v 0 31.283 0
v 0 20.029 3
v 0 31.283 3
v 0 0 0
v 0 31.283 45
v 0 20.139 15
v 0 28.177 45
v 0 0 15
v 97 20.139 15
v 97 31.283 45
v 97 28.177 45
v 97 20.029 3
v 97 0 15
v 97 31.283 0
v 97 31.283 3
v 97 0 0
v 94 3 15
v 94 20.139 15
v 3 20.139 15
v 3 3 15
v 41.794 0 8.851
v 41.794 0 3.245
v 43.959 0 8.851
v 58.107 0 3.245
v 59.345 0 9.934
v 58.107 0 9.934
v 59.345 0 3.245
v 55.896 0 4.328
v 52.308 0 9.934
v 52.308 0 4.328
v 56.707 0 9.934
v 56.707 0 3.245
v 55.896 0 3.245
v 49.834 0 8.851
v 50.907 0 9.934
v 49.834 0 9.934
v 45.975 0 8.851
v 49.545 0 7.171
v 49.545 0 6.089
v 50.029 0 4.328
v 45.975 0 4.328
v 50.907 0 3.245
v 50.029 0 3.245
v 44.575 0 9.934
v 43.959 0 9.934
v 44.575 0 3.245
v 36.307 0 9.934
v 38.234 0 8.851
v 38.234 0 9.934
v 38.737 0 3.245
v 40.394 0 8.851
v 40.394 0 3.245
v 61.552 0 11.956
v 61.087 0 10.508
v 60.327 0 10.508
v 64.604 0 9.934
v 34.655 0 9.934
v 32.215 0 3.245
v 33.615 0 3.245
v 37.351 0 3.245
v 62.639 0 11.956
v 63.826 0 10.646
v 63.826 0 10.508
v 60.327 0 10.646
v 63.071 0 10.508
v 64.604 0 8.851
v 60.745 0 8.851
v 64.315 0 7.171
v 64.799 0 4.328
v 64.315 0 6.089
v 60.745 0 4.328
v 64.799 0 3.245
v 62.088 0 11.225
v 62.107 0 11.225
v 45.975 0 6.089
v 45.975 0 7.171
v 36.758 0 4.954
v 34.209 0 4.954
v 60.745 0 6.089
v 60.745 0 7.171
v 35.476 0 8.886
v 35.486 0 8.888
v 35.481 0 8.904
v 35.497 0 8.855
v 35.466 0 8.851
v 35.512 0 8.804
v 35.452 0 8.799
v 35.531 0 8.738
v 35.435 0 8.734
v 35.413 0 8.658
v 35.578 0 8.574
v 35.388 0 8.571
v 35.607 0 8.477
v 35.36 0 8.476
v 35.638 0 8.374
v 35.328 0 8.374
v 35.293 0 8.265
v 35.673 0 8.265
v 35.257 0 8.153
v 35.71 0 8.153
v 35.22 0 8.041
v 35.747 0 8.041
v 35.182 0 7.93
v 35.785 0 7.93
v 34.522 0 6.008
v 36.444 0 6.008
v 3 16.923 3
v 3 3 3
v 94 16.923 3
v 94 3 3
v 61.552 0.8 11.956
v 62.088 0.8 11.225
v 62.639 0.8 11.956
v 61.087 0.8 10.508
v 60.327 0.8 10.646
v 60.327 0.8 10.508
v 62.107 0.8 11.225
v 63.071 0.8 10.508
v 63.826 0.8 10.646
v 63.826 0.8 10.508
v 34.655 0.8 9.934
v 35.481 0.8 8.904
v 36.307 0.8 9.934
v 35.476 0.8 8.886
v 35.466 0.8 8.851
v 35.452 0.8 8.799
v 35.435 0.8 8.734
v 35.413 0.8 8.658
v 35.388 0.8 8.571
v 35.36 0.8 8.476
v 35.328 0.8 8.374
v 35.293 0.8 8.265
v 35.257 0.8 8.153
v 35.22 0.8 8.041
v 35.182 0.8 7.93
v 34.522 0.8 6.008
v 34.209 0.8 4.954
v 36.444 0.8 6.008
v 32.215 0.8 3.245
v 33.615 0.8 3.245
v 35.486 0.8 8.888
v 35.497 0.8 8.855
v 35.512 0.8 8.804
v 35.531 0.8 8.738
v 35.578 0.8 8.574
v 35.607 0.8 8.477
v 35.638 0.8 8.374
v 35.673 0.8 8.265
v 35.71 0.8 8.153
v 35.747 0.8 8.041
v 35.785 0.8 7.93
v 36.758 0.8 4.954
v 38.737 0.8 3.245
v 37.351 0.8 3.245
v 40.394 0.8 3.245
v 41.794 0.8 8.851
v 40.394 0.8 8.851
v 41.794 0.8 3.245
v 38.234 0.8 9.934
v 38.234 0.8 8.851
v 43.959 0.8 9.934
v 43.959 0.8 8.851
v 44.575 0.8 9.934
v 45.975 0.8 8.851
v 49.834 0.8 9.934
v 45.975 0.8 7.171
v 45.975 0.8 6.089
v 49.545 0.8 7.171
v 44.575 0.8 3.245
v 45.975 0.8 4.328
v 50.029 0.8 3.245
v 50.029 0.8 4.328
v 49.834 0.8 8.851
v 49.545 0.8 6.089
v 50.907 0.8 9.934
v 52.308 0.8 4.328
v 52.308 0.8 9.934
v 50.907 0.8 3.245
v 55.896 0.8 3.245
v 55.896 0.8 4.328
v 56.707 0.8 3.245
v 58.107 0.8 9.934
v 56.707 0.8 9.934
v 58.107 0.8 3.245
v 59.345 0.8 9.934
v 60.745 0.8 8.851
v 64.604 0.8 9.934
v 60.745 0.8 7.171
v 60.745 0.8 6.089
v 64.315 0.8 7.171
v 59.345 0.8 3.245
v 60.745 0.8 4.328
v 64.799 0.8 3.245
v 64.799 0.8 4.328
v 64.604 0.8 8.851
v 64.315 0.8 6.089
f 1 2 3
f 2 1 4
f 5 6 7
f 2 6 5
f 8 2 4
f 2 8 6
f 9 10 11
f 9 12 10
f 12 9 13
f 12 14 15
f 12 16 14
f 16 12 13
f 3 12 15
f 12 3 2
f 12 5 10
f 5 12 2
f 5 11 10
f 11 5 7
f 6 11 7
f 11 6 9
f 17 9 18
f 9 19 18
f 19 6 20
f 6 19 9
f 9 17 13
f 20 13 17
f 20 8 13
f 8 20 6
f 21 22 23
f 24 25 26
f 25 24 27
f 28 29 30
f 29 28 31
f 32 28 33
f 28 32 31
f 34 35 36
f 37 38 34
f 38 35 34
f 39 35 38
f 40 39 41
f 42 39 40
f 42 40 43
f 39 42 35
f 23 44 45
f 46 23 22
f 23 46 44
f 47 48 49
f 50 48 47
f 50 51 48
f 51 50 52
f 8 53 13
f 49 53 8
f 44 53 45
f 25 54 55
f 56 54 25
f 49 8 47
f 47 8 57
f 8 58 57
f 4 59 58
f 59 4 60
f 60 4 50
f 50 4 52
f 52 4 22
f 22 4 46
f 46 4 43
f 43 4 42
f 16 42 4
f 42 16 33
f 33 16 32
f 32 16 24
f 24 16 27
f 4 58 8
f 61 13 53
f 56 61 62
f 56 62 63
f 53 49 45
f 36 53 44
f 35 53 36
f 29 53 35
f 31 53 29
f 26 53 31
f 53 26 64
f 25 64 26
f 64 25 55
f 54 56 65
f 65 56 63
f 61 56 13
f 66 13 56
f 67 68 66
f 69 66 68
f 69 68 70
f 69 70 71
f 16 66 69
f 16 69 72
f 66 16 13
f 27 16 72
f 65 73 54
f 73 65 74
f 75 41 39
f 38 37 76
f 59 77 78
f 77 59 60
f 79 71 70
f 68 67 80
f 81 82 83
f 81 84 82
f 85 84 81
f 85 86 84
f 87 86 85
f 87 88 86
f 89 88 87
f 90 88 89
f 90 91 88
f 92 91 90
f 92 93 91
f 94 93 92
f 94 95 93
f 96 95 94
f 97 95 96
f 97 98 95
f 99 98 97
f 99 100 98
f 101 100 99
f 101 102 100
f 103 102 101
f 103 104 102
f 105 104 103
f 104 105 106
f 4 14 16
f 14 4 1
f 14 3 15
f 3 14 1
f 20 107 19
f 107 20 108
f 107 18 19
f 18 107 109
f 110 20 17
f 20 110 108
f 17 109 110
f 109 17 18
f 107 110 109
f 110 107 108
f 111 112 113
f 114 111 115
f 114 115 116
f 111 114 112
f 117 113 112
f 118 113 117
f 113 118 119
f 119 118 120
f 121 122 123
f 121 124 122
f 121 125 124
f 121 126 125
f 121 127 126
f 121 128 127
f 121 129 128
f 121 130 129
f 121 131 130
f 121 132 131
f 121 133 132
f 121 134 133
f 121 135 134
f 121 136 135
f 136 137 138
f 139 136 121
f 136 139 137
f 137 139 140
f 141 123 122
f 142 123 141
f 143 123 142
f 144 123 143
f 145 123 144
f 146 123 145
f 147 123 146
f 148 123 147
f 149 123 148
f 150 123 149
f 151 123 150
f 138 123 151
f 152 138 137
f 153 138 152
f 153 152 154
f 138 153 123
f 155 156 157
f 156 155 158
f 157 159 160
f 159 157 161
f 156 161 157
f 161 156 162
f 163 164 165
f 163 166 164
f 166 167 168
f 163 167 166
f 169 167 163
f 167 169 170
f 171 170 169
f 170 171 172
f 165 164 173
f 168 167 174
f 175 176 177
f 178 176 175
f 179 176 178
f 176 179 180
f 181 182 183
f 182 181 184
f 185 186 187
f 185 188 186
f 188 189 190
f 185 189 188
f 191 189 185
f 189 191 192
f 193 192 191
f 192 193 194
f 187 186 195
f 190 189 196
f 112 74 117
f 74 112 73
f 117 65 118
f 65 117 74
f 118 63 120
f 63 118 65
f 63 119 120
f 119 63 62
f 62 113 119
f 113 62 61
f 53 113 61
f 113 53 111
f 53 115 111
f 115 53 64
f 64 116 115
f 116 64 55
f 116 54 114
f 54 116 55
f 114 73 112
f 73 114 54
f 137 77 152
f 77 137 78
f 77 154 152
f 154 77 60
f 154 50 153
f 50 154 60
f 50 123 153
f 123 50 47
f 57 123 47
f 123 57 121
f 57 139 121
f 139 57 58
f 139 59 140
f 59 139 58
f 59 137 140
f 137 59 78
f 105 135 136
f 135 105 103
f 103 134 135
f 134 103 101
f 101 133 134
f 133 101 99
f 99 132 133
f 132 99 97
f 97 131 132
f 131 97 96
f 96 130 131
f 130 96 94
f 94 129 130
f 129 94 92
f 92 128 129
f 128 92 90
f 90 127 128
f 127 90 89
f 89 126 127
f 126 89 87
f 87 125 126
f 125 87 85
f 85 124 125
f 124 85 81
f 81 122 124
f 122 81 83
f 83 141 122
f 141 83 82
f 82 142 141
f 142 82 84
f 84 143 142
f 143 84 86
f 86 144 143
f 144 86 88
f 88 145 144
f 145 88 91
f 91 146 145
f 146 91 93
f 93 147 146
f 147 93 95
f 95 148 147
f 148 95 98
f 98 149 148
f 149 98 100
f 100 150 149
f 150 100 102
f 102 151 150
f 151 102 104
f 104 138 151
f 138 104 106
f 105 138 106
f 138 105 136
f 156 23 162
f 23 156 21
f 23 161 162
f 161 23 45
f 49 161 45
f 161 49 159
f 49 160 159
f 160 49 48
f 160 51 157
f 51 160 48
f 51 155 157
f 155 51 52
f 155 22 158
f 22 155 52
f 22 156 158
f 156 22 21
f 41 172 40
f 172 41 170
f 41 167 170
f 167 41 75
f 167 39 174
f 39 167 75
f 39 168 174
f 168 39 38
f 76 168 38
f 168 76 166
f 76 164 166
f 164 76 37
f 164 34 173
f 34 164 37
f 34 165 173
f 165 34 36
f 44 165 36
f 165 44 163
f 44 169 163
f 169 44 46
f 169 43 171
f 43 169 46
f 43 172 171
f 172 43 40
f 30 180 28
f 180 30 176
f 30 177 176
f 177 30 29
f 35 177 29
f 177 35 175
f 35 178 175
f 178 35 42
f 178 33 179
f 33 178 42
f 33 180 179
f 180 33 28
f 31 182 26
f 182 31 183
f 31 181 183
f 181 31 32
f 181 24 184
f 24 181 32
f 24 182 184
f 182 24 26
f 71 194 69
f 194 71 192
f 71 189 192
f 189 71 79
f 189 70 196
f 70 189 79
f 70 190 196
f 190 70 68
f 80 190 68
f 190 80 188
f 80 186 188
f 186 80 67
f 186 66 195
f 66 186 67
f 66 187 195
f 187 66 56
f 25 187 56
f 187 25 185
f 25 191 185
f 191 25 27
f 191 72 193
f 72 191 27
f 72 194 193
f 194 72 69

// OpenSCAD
card_w       = 90;
card_h       = 50;
stack        = 12;
clr_w        = 1;
clr_d        = 1.5;
angle        = 15;
wall_side    = 3;
front_t      = 3;
front_h      = 15;
floor_t      = 3;
back_t       = 3;
total_h      = 45;
lip_extra    = 1;
eps          = 0.01;
label        = "ATELIÊ";
font_name    = "Liberation Sans:style=Bold";
text_size    = 7;
text_depth   = 0.8;
pocket_d = stack / cos(angle) + clr_d;
bt       = back_t / cos(angle);
y0       = front_t + pocket_d;
W        = card_w + clr_w + 2 * wall_side;
D        = y0 + bt + (total_h - floor_t) * tan(angle);
H        = total_h;
echo(largura = W, profundidade = D, altura = H);
module outer_profile() {
    polygon([
        [0, 0],
        [D, 0],
        [D, total_h],
        [y0 + (total_h - floor_t) * tan(angle), total_h],
        [y0 + (front_h - floor_t) * tan(angle), front_h],
        [0, front_h]
    ]);
}
module rear_void() {
    polygon([
        [y0 + bt, floor_t],
        [D + eps, floor_t],
        [D + eps, total_h - eps],
        [D, total_h]
    ]);
}
module pocket_profile() {
    zc = front_h + lip_extra;
    polygon([
        [front_t, floor_t],
        [y0, floor_t],
        [y0 + (zc - floor_t) * tan(angle), zc],
        [front_t, zc]
    ]);
}
module along_x(len) {
    rotate([90, 0, 90]) linear_extrude(height = len) children();
}
difference() {
    along_x(W) difference() {
        outer_profile();
        rear_void();
    }
    translate([wall_side, 0, 0]) along_x(card_w + clr_w) pocket_profile();
    translate([W / 2, text_depth, front_h / 2])
        rotate([90, 0, 0])
            linear_extrude(height = text_depth + eps)
                text(label, size = text_size, font = font_name,
                     halign = "center", valign = "center");
}
